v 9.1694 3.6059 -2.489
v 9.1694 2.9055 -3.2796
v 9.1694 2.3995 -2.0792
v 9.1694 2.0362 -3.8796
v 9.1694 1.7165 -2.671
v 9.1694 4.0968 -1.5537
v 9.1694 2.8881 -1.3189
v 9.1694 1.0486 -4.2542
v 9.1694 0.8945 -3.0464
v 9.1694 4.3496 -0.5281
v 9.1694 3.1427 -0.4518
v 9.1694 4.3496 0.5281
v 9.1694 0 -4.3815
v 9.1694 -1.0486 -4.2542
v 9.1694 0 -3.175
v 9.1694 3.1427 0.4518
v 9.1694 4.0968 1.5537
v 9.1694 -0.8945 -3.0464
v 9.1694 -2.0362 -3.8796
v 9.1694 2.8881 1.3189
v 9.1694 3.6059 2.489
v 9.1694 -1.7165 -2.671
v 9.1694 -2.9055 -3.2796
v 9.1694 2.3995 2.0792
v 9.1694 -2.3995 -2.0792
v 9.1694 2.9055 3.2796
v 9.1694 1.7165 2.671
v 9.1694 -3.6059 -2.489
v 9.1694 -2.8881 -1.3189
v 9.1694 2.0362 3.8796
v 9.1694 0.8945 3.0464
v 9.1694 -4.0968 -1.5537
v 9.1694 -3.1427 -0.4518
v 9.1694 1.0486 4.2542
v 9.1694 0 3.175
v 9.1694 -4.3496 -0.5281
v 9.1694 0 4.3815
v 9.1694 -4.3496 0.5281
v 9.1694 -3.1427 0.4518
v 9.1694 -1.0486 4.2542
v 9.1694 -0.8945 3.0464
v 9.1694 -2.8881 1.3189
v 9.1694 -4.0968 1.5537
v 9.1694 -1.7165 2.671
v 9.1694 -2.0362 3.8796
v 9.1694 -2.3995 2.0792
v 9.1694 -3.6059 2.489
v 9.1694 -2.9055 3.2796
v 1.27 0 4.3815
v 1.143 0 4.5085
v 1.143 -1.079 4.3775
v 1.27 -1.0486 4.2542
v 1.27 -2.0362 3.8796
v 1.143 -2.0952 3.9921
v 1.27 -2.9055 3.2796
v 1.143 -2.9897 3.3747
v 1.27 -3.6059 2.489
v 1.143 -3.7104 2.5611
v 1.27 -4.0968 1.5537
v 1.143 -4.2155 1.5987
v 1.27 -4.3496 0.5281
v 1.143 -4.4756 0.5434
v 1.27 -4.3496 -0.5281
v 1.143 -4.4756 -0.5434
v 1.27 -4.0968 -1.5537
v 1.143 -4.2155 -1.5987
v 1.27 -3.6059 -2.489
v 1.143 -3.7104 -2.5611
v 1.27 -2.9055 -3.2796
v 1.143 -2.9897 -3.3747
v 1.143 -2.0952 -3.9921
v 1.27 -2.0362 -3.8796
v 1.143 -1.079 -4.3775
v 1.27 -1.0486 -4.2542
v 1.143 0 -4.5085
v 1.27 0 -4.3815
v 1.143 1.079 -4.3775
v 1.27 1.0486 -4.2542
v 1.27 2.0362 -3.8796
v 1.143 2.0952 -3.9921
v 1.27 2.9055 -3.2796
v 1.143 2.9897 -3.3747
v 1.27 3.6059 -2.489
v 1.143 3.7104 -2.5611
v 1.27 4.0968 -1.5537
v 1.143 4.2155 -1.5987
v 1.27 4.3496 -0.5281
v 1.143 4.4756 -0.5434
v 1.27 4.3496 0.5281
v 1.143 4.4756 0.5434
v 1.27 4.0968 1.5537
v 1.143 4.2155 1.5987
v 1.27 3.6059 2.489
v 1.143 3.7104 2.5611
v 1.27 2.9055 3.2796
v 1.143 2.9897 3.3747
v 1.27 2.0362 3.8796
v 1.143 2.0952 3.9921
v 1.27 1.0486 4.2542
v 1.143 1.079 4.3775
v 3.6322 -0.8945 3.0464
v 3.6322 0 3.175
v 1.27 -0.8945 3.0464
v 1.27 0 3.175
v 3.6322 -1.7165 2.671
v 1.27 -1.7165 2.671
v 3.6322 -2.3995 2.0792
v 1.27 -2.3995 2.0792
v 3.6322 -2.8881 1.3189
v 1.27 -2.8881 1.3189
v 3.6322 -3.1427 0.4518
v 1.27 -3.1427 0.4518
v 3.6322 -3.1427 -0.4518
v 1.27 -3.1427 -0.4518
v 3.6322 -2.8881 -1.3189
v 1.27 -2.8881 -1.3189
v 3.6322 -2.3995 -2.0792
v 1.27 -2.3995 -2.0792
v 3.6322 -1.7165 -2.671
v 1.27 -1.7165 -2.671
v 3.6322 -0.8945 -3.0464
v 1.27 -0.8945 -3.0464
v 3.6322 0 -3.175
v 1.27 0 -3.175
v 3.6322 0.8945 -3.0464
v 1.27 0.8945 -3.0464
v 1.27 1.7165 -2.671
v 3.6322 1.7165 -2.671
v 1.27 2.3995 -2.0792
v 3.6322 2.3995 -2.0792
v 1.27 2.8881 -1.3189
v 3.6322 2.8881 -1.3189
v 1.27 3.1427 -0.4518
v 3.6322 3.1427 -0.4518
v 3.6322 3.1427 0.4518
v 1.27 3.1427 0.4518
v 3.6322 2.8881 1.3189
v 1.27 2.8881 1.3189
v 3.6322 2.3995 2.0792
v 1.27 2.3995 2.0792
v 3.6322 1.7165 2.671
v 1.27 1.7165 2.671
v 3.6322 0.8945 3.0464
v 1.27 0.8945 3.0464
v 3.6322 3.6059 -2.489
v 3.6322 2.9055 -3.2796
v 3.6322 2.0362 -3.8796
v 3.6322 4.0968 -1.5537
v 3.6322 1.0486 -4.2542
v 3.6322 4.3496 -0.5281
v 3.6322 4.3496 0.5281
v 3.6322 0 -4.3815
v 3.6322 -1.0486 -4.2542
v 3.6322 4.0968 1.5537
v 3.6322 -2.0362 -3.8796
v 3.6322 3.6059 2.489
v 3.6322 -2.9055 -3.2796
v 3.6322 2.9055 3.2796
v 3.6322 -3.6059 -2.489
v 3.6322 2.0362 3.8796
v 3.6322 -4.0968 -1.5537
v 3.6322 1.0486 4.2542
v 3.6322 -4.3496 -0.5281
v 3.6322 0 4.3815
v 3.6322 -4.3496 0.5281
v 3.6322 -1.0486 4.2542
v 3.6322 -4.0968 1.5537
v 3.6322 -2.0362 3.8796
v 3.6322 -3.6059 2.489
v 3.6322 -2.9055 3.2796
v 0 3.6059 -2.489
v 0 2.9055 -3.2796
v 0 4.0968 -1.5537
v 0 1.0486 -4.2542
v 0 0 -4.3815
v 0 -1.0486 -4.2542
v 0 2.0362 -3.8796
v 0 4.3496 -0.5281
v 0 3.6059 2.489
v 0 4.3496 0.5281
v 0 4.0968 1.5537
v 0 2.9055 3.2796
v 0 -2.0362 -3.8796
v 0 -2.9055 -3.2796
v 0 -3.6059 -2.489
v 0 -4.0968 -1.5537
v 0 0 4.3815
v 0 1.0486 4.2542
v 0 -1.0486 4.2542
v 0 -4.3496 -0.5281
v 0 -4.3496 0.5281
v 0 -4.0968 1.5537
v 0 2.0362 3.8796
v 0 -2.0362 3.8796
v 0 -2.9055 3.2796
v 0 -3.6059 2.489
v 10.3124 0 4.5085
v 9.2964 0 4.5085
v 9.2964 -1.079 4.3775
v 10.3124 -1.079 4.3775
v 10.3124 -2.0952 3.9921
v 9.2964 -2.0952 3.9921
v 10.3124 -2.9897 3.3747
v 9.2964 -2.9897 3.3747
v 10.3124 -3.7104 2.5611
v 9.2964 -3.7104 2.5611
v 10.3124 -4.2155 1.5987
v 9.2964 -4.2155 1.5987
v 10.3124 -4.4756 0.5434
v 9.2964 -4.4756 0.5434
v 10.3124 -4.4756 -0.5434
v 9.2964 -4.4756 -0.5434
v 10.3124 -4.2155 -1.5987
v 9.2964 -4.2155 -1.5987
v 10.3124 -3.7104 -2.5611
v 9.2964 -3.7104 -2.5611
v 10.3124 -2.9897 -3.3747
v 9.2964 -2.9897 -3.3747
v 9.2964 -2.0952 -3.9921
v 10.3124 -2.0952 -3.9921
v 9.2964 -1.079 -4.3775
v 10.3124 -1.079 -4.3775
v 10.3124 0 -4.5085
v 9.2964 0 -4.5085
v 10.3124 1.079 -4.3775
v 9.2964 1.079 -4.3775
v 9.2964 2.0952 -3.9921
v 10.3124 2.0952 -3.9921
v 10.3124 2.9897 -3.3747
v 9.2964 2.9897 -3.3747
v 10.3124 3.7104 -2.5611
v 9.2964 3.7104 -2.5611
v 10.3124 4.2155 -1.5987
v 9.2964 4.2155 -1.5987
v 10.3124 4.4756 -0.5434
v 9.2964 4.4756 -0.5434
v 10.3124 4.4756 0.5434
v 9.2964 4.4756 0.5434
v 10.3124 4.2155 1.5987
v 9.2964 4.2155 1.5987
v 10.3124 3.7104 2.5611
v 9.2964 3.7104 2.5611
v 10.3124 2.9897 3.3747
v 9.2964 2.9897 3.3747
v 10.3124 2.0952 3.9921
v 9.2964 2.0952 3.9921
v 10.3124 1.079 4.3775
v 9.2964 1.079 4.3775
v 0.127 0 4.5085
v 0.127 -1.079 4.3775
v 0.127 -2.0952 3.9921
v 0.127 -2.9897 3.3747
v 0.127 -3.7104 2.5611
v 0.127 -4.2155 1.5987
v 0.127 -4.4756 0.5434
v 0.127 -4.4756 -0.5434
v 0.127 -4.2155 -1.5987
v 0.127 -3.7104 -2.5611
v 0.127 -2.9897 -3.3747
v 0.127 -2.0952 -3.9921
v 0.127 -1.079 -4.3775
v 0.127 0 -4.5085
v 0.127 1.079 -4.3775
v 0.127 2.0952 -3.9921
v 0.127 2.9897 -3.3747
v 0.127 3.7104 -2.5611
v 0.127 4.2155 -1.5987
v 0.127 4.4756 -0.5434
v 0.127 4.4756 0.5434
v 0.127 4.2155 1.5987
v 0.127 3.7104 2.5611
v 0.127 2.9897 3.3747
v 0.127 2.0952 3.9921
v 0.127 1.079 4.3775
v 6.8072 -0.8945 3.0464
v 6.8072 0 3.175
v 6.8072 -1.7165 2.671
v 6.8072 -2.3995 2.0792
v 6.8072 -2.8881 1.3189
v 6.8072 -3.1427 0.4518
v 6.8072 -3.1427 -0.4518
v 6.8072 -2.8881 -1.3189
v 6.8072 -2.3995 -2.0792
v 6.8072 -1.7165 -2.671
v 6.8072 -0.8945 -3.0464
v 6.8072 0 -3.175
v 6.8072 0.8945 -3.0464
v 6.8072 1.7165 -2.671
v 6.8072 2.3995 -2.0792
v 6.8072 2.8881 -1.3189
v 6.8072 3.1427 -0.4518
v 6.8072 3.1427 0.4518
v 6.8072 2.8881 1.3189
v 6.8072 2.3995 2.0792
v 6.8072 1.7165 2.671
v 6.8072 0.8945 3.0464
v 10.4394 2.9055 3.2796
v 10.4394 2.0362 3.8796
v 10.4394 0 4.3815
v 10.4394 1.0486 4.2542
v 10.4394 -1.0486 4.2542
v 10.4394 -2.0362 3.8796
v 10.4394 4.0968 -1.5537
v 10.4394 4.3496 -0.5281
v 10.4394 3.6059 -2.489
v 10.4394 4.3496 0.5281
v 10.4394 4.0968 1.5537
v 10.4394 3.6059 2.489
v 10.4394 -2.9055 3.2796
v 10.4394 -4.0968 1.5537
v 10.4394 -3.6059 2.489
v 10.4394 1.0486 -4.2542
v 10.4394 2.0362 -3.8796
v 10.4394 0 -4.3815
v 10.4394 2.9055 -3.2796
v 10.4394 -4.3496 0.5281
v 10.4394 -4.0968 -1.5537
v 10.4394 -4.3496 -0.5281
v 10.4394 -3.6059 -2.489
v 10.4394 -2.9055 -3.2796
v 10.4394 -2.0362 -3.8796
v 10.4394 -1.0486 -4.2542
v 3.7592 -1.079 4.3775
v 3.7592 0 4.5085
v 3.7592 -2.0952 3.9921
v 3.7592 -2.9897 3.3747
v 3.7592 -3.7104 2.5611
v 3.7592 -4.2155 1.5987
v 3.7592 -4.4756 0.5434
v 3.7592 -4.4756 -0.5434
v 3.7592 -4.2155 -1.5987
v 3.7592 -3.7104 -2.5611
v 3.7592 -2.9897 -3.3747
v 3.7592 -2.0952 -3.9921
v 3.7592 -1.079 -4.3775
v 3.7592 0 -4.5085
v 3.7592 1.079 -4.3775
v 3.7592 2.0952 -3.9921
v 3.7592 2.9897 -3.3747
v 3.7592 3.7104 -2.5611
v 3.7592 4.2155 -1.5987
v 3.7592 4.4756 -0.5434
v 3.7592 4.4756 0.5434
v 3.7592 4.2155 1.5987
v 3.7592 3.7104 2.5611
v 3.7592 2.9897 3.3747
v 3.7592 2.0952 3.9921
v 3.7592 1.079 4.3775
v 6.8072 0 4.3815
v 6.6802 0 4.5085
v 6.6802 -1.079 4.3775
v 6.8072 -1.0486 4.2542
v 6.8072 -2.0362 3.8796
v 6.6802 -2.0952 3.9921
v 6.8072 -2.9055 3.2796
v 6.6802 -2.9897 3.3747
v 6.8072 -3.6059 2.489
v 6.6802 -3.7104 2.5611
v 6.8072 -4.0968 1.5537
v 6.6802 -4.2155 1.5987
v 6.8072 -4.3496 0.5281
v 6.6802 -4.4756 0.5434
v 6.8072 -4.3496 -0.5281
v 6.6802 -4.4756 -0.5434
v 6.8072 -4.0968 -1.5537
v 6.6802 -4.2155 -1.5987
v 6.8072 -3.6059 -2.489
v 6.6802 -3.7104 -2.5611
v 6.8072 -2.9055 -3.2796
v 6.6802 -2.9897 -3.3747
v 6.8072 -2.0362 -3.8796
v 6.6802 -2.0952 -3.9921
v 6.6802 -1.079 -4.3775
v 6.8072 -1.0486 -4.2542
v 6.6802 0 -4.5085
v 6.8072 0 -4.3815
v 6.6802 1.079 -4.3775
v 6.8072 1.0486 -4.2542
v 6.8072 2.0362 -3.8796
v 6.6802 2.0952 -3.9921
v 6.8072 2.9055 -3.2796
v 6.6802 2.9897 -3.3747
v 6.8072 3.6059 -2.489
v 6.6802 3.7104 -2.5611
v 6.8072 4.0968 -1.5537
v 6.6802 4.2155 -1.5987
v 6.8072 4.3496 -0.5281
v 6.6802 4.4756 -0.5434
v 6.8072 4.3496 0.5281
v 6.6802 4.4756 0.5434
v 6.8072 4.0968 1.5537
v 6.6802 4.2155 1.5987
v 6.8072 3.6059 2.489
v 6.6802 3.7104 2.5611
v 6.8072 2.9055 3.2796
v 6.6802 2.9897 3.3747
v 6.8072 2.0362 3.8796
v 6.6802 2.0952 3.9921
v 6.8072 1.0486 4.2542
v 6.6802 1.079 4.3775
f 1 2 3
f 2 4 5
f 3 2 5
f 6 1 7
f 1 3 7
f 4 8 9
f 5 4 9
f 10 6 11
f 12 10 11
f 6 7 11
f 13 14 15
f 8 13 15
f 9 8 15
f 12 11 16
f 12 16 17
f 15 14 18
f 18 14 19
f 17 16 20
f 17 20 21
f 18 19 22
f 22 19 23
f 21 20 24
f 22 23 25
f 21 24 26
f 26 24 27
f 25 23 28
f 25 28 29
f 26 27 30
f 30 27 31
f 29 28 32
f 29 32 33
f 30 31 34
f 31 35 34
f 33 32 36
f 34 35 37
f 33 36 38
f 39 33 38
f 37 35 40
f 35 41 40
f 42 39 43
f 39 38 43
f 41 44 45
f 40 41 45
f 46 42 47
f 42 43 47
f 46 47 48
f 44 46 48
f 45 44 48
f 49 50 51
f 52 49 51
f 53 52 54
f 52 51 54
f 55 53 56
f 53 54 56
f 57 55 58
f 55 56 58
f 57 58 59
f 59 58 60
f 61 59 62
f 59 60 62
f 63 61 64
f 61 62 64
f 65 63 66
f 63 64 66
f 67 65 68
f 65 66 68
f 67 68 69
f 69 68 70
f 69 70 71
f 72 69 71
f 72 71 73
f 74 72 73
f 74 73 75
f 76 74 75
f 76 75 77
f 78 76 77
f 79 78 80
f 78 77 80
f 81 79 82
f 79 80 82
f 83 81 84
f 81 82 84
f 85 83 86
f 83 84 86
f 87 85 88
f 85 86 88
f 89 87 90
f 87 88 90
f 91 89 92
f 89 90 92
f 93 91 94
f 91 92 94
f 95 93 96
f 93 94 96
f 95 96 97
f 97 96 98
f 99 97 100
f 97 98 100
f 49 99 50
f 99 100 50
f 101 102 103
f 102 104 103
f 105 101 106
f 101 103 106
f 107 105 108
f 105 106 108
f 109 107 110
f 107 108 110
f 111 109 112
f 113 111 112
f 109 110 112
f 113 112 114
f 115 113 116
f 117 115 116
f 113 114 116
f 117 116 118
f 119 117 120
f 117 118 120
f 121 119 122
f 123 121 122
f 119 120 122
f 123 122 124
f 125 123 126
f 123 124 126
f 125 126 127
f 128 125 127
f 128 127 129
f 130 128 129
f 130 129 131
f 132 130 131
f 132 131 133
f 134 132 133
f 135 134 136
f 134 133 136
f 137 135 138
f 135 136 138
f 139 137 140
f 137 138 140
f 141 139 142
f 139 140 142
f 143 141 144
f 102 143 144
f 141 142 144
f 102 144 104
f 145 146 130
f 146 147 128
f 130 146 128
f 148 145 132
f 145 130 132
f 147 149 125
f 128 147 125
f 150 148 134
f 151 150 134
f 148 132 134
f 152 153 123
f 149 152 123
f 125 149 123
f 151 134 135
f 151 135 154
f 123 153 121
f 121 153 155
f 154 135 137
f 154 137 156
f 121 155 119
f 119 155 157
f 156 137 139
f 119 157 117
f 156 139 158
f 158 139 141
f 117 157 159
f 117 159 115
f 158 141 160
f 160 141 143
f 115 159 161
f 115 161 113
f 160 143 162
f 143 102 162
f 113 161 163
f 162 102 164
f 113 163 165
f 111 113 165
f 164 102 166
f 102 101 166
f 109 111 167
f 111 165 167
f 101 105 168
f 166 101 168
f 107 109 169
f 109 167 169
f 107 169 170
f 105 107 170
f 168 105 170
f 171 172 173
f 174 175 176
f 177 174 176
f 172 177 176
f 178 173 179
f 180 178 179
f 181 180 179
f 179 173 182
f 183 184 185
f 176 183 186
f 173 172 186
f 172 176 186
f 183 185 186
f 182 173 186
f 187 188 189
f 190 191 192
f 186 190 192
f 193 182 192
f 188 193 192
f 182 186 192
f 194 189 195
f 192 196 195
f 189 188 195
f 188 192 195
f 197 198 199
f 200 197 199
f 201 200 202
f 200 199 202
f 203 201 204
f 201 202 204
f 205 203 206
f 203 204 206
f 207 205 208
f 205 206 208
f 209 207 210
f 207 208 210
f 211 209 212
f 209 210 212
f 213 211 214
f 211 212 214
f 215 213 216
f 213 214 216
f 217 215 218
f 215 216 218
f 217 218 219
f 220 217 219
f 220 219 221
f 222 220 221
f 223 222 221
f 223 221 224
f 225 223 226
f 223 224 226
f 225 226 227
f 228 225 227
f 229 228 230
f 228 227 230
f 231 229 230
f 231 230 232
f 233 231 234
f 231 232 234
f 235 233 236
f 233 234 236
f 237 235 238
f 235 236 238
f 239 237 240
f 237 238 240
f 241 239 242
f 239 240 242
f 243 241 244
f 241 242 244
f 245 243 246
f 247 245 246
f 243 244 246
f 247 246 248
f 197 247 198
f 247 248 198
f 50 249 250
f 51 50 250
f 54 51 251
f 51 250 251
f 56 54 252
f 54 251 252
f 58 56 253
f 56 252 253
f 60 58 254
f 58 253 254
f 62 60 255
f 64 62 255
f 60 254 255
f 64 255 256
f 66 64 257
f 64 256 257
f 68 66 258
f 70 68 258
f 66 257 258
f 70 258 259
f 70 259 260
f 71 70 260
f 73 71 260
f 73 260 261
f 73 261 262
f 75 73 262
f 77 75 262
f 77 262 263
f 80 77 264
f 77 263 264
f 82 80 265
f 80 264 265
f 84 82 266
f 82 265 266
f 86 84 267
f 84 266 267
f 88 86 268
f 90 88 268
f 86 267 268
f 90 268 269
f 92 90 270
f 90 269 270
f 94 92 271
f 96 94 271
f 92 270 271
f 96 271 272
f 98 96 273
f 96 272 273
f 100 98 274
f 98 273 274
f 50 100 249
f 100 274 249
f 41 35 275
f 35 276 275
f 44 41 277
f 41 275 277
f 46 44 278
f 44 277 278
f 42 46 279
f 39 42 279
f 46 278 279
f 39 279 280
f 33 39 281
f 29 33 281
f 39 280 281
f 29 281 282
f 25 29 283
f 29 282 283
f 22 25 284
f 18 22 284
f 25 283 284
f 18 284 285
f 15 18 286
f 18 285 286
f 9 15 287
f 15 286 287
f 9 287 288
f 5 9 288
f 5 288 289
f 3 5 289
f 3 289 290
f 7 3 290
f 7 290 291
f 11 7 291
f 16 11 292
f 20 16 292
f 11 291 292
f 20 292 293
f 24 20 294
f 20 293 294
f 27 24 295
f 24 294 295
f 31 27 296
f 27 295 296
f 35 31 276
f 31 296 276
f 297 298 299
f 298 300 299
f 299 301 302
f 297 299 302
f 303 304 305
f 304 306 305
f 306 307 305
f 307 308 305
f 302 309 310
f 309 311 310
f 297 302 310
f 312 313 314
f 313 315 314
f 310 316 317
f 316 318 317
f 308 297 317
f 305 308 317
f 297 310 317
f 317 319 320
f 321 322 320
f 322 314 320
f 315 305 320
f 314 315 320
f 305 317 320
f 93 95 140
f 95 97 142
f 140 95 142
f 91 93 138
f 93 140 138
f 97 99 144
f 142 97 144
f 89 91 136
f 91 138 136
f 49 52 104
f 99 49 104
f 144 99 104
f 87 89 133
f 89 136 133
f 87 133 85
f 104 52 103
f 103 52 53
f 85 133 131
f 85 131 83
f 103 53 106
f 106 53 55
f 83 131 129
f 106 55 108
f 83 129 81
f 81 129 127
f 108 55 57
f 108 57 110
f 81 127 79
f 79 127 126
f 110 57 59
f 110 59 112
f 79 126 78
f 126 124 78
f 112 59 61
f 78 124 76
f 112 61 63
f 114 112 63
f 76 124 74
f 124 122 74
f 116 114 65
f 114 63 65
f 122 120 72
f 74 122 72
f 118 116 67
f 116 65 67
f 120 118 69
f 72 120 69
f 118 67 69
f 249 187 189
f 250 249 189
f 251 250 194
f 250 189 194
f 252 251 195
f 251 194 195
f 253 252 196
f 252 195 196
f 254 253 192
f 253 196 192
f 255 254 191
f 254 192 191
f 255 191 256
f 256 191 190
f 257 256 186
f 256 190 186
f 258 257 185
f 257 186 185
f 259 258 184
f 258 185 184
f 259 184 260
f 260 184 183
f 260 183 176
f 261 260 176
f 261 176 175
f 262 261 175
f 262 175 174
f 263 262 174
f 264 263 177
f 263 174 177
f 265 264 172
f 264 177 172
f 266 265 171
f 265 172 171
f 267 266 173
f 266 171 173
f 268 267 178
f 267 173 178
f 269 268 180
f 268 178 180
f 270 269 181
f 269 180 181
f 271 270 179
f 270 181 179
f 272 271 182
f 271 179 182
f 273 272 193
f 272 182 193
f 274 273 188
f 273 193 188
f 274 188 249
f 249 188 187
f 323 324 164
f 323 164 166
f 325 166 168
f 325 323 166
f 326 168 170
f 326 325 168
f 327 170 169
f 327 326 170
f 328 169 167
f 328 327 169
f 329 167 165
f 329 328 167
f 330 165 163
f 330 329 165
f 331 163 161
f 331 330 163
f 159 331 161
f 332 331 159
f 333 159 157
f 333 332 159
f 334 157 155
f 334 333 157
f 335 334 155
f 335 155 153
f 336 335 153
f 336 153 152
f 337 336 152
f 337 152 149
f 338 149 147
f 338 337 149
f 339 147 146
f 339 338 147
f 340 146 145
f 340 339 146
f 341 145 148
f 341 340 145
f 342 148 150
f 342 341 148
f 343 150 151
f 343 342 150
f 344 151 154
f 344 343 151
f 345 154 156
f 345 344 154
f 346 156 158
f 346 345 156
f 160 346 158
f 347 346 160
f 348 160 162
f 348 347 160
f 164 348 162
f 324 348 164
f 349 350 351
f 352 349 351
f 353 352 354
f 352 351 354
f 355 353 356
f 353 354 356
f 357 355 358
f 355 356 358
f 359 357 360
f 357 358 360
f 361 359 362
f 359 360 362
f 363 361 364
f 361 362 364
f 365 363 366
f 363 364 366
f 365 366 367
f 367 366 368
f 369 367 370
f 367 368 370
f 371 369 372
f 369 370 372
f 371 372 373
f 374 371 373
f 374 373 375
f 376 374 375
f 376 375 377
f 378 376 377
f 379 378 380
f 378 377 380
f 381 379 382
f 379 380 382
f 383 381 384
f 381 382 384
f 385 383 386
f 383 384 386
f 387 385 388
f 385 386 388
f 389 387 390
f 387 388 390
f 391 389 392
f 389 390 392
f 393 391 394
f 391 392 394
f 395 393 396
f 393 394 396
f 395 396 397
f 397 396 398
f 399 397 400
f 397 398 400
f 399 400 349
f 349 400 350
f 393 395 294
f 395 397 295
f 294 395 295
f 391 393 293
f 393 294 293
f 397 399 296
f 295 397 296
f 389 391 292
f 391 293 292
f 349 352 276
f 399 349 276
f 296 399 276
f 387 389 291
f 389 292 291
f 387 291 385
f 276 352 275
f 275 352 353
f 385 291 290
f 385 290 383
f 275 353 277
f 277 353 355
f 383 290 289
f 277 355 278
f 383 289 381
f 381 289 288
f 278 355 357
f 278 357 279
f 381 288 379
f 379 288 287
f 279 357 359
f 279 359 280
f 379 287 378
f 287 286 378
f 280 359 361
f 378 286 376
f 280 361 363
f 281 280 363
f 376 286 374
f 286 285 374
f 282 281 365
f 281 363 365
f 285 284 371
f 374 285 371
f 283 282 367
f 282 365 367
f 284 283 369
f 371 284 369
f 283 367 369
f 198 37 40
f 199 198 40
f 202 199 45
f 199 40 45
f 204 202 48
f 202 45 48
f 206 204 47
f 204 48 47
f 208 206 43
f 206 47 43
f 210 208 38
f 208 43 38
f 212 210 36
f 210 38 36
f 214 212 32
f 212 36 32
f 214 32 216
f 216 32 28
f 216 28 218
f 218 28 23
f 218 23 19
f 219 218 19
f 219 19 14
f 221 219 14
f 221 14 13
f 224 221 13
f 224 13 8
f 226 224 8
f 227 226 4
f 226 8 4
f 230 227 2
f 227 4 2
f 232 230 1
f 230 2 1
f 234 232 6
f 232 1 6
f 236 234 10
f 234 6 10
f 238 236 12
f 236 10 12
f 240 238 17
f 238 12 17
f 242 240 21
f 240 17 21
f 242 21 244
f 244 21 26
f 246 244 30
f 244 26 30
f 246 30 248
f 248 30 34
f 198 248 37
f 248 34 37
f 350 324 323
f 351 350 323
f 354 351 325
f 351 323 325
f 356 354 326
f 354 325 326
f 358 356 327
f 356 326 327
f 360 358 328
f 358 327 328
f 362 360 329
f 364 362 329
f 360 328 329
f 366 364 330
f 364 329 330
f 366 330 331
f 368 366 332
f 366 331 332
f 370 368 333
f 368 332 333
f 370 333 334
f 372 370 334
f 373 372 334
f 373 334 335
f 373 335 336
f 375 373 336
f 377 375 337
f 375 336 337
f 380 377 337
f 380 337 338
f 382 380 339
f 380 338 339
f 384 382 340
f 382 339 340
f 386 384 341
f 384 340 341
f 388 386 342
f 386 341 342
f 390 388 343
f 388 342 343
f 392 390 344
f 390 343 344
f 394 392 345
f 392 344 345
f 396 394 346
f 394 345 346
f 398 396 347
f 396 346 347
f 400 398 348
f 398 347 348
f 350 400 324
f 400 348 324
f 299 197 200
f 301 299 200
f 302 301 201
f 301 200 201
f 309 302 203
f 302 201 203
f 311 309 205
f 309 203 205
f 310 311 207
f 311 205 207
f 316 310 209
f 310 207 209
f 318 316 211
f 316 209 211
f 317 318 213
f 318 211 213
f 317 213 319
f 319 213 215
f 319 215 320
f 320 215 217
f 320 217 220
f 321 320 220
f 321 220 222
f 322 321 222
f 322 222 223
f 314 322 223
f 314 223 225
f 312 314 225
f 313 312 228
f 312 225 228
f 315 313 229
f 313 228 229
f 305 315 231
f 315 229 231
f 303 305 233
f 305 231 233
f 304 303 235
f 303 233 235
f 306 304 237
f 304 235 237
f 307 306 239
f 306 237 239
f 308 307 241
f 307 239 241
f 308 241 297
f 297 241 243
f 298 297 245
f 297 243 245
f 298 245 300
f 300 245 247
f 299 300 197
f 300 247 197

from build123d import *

# Parameters (mm, degrees)
VENT_EDGE_BREAK_SIZE = 0.127


with BuildPart() as part:
    # Sketch2 → Revolve1 (revolve)
    with BuildSketch(Plane.XY, mode=Mode.PRIVATE) as revolve1_sk:
        Polygon((3.6322, 4.5085), (3.6322, 3.175), (1.27, 3.175), (1.27, 4.5085), (0, 4.5085), (0, 0), (10.4394, 0), (10.4394, 4.5085), (9.1694, 4.5085), (9.1694, 3.175), (6.8072, 3.175), (6.8072, 4.5085), align=None)
    revolve(revolve1_sk.sketch.rotate(Axis((-1.617419624, 0, 0), (1, 0, 0)), 90), axis=Axis((-1.617419624, 0, 0), (1, 0, 0)))

    # vent-edge-break
    vent_edge_break_edges = [part.edges().sort_by_distance(p)[0] for p in [
        (3.6322, 0, -4.5085),
        (6.8072, 0, -4.5085),
        (9.1694, 0, -4.5085),
        (10.4394, 0, -4.5085),
        (0, 0, -4.5085),
        (1.27, 0, -4.5085),
    ]]
    chamfer(vent_edge_break_edges, length=VENT_EDGE_BREAK_SIZE)


solid = part.part
